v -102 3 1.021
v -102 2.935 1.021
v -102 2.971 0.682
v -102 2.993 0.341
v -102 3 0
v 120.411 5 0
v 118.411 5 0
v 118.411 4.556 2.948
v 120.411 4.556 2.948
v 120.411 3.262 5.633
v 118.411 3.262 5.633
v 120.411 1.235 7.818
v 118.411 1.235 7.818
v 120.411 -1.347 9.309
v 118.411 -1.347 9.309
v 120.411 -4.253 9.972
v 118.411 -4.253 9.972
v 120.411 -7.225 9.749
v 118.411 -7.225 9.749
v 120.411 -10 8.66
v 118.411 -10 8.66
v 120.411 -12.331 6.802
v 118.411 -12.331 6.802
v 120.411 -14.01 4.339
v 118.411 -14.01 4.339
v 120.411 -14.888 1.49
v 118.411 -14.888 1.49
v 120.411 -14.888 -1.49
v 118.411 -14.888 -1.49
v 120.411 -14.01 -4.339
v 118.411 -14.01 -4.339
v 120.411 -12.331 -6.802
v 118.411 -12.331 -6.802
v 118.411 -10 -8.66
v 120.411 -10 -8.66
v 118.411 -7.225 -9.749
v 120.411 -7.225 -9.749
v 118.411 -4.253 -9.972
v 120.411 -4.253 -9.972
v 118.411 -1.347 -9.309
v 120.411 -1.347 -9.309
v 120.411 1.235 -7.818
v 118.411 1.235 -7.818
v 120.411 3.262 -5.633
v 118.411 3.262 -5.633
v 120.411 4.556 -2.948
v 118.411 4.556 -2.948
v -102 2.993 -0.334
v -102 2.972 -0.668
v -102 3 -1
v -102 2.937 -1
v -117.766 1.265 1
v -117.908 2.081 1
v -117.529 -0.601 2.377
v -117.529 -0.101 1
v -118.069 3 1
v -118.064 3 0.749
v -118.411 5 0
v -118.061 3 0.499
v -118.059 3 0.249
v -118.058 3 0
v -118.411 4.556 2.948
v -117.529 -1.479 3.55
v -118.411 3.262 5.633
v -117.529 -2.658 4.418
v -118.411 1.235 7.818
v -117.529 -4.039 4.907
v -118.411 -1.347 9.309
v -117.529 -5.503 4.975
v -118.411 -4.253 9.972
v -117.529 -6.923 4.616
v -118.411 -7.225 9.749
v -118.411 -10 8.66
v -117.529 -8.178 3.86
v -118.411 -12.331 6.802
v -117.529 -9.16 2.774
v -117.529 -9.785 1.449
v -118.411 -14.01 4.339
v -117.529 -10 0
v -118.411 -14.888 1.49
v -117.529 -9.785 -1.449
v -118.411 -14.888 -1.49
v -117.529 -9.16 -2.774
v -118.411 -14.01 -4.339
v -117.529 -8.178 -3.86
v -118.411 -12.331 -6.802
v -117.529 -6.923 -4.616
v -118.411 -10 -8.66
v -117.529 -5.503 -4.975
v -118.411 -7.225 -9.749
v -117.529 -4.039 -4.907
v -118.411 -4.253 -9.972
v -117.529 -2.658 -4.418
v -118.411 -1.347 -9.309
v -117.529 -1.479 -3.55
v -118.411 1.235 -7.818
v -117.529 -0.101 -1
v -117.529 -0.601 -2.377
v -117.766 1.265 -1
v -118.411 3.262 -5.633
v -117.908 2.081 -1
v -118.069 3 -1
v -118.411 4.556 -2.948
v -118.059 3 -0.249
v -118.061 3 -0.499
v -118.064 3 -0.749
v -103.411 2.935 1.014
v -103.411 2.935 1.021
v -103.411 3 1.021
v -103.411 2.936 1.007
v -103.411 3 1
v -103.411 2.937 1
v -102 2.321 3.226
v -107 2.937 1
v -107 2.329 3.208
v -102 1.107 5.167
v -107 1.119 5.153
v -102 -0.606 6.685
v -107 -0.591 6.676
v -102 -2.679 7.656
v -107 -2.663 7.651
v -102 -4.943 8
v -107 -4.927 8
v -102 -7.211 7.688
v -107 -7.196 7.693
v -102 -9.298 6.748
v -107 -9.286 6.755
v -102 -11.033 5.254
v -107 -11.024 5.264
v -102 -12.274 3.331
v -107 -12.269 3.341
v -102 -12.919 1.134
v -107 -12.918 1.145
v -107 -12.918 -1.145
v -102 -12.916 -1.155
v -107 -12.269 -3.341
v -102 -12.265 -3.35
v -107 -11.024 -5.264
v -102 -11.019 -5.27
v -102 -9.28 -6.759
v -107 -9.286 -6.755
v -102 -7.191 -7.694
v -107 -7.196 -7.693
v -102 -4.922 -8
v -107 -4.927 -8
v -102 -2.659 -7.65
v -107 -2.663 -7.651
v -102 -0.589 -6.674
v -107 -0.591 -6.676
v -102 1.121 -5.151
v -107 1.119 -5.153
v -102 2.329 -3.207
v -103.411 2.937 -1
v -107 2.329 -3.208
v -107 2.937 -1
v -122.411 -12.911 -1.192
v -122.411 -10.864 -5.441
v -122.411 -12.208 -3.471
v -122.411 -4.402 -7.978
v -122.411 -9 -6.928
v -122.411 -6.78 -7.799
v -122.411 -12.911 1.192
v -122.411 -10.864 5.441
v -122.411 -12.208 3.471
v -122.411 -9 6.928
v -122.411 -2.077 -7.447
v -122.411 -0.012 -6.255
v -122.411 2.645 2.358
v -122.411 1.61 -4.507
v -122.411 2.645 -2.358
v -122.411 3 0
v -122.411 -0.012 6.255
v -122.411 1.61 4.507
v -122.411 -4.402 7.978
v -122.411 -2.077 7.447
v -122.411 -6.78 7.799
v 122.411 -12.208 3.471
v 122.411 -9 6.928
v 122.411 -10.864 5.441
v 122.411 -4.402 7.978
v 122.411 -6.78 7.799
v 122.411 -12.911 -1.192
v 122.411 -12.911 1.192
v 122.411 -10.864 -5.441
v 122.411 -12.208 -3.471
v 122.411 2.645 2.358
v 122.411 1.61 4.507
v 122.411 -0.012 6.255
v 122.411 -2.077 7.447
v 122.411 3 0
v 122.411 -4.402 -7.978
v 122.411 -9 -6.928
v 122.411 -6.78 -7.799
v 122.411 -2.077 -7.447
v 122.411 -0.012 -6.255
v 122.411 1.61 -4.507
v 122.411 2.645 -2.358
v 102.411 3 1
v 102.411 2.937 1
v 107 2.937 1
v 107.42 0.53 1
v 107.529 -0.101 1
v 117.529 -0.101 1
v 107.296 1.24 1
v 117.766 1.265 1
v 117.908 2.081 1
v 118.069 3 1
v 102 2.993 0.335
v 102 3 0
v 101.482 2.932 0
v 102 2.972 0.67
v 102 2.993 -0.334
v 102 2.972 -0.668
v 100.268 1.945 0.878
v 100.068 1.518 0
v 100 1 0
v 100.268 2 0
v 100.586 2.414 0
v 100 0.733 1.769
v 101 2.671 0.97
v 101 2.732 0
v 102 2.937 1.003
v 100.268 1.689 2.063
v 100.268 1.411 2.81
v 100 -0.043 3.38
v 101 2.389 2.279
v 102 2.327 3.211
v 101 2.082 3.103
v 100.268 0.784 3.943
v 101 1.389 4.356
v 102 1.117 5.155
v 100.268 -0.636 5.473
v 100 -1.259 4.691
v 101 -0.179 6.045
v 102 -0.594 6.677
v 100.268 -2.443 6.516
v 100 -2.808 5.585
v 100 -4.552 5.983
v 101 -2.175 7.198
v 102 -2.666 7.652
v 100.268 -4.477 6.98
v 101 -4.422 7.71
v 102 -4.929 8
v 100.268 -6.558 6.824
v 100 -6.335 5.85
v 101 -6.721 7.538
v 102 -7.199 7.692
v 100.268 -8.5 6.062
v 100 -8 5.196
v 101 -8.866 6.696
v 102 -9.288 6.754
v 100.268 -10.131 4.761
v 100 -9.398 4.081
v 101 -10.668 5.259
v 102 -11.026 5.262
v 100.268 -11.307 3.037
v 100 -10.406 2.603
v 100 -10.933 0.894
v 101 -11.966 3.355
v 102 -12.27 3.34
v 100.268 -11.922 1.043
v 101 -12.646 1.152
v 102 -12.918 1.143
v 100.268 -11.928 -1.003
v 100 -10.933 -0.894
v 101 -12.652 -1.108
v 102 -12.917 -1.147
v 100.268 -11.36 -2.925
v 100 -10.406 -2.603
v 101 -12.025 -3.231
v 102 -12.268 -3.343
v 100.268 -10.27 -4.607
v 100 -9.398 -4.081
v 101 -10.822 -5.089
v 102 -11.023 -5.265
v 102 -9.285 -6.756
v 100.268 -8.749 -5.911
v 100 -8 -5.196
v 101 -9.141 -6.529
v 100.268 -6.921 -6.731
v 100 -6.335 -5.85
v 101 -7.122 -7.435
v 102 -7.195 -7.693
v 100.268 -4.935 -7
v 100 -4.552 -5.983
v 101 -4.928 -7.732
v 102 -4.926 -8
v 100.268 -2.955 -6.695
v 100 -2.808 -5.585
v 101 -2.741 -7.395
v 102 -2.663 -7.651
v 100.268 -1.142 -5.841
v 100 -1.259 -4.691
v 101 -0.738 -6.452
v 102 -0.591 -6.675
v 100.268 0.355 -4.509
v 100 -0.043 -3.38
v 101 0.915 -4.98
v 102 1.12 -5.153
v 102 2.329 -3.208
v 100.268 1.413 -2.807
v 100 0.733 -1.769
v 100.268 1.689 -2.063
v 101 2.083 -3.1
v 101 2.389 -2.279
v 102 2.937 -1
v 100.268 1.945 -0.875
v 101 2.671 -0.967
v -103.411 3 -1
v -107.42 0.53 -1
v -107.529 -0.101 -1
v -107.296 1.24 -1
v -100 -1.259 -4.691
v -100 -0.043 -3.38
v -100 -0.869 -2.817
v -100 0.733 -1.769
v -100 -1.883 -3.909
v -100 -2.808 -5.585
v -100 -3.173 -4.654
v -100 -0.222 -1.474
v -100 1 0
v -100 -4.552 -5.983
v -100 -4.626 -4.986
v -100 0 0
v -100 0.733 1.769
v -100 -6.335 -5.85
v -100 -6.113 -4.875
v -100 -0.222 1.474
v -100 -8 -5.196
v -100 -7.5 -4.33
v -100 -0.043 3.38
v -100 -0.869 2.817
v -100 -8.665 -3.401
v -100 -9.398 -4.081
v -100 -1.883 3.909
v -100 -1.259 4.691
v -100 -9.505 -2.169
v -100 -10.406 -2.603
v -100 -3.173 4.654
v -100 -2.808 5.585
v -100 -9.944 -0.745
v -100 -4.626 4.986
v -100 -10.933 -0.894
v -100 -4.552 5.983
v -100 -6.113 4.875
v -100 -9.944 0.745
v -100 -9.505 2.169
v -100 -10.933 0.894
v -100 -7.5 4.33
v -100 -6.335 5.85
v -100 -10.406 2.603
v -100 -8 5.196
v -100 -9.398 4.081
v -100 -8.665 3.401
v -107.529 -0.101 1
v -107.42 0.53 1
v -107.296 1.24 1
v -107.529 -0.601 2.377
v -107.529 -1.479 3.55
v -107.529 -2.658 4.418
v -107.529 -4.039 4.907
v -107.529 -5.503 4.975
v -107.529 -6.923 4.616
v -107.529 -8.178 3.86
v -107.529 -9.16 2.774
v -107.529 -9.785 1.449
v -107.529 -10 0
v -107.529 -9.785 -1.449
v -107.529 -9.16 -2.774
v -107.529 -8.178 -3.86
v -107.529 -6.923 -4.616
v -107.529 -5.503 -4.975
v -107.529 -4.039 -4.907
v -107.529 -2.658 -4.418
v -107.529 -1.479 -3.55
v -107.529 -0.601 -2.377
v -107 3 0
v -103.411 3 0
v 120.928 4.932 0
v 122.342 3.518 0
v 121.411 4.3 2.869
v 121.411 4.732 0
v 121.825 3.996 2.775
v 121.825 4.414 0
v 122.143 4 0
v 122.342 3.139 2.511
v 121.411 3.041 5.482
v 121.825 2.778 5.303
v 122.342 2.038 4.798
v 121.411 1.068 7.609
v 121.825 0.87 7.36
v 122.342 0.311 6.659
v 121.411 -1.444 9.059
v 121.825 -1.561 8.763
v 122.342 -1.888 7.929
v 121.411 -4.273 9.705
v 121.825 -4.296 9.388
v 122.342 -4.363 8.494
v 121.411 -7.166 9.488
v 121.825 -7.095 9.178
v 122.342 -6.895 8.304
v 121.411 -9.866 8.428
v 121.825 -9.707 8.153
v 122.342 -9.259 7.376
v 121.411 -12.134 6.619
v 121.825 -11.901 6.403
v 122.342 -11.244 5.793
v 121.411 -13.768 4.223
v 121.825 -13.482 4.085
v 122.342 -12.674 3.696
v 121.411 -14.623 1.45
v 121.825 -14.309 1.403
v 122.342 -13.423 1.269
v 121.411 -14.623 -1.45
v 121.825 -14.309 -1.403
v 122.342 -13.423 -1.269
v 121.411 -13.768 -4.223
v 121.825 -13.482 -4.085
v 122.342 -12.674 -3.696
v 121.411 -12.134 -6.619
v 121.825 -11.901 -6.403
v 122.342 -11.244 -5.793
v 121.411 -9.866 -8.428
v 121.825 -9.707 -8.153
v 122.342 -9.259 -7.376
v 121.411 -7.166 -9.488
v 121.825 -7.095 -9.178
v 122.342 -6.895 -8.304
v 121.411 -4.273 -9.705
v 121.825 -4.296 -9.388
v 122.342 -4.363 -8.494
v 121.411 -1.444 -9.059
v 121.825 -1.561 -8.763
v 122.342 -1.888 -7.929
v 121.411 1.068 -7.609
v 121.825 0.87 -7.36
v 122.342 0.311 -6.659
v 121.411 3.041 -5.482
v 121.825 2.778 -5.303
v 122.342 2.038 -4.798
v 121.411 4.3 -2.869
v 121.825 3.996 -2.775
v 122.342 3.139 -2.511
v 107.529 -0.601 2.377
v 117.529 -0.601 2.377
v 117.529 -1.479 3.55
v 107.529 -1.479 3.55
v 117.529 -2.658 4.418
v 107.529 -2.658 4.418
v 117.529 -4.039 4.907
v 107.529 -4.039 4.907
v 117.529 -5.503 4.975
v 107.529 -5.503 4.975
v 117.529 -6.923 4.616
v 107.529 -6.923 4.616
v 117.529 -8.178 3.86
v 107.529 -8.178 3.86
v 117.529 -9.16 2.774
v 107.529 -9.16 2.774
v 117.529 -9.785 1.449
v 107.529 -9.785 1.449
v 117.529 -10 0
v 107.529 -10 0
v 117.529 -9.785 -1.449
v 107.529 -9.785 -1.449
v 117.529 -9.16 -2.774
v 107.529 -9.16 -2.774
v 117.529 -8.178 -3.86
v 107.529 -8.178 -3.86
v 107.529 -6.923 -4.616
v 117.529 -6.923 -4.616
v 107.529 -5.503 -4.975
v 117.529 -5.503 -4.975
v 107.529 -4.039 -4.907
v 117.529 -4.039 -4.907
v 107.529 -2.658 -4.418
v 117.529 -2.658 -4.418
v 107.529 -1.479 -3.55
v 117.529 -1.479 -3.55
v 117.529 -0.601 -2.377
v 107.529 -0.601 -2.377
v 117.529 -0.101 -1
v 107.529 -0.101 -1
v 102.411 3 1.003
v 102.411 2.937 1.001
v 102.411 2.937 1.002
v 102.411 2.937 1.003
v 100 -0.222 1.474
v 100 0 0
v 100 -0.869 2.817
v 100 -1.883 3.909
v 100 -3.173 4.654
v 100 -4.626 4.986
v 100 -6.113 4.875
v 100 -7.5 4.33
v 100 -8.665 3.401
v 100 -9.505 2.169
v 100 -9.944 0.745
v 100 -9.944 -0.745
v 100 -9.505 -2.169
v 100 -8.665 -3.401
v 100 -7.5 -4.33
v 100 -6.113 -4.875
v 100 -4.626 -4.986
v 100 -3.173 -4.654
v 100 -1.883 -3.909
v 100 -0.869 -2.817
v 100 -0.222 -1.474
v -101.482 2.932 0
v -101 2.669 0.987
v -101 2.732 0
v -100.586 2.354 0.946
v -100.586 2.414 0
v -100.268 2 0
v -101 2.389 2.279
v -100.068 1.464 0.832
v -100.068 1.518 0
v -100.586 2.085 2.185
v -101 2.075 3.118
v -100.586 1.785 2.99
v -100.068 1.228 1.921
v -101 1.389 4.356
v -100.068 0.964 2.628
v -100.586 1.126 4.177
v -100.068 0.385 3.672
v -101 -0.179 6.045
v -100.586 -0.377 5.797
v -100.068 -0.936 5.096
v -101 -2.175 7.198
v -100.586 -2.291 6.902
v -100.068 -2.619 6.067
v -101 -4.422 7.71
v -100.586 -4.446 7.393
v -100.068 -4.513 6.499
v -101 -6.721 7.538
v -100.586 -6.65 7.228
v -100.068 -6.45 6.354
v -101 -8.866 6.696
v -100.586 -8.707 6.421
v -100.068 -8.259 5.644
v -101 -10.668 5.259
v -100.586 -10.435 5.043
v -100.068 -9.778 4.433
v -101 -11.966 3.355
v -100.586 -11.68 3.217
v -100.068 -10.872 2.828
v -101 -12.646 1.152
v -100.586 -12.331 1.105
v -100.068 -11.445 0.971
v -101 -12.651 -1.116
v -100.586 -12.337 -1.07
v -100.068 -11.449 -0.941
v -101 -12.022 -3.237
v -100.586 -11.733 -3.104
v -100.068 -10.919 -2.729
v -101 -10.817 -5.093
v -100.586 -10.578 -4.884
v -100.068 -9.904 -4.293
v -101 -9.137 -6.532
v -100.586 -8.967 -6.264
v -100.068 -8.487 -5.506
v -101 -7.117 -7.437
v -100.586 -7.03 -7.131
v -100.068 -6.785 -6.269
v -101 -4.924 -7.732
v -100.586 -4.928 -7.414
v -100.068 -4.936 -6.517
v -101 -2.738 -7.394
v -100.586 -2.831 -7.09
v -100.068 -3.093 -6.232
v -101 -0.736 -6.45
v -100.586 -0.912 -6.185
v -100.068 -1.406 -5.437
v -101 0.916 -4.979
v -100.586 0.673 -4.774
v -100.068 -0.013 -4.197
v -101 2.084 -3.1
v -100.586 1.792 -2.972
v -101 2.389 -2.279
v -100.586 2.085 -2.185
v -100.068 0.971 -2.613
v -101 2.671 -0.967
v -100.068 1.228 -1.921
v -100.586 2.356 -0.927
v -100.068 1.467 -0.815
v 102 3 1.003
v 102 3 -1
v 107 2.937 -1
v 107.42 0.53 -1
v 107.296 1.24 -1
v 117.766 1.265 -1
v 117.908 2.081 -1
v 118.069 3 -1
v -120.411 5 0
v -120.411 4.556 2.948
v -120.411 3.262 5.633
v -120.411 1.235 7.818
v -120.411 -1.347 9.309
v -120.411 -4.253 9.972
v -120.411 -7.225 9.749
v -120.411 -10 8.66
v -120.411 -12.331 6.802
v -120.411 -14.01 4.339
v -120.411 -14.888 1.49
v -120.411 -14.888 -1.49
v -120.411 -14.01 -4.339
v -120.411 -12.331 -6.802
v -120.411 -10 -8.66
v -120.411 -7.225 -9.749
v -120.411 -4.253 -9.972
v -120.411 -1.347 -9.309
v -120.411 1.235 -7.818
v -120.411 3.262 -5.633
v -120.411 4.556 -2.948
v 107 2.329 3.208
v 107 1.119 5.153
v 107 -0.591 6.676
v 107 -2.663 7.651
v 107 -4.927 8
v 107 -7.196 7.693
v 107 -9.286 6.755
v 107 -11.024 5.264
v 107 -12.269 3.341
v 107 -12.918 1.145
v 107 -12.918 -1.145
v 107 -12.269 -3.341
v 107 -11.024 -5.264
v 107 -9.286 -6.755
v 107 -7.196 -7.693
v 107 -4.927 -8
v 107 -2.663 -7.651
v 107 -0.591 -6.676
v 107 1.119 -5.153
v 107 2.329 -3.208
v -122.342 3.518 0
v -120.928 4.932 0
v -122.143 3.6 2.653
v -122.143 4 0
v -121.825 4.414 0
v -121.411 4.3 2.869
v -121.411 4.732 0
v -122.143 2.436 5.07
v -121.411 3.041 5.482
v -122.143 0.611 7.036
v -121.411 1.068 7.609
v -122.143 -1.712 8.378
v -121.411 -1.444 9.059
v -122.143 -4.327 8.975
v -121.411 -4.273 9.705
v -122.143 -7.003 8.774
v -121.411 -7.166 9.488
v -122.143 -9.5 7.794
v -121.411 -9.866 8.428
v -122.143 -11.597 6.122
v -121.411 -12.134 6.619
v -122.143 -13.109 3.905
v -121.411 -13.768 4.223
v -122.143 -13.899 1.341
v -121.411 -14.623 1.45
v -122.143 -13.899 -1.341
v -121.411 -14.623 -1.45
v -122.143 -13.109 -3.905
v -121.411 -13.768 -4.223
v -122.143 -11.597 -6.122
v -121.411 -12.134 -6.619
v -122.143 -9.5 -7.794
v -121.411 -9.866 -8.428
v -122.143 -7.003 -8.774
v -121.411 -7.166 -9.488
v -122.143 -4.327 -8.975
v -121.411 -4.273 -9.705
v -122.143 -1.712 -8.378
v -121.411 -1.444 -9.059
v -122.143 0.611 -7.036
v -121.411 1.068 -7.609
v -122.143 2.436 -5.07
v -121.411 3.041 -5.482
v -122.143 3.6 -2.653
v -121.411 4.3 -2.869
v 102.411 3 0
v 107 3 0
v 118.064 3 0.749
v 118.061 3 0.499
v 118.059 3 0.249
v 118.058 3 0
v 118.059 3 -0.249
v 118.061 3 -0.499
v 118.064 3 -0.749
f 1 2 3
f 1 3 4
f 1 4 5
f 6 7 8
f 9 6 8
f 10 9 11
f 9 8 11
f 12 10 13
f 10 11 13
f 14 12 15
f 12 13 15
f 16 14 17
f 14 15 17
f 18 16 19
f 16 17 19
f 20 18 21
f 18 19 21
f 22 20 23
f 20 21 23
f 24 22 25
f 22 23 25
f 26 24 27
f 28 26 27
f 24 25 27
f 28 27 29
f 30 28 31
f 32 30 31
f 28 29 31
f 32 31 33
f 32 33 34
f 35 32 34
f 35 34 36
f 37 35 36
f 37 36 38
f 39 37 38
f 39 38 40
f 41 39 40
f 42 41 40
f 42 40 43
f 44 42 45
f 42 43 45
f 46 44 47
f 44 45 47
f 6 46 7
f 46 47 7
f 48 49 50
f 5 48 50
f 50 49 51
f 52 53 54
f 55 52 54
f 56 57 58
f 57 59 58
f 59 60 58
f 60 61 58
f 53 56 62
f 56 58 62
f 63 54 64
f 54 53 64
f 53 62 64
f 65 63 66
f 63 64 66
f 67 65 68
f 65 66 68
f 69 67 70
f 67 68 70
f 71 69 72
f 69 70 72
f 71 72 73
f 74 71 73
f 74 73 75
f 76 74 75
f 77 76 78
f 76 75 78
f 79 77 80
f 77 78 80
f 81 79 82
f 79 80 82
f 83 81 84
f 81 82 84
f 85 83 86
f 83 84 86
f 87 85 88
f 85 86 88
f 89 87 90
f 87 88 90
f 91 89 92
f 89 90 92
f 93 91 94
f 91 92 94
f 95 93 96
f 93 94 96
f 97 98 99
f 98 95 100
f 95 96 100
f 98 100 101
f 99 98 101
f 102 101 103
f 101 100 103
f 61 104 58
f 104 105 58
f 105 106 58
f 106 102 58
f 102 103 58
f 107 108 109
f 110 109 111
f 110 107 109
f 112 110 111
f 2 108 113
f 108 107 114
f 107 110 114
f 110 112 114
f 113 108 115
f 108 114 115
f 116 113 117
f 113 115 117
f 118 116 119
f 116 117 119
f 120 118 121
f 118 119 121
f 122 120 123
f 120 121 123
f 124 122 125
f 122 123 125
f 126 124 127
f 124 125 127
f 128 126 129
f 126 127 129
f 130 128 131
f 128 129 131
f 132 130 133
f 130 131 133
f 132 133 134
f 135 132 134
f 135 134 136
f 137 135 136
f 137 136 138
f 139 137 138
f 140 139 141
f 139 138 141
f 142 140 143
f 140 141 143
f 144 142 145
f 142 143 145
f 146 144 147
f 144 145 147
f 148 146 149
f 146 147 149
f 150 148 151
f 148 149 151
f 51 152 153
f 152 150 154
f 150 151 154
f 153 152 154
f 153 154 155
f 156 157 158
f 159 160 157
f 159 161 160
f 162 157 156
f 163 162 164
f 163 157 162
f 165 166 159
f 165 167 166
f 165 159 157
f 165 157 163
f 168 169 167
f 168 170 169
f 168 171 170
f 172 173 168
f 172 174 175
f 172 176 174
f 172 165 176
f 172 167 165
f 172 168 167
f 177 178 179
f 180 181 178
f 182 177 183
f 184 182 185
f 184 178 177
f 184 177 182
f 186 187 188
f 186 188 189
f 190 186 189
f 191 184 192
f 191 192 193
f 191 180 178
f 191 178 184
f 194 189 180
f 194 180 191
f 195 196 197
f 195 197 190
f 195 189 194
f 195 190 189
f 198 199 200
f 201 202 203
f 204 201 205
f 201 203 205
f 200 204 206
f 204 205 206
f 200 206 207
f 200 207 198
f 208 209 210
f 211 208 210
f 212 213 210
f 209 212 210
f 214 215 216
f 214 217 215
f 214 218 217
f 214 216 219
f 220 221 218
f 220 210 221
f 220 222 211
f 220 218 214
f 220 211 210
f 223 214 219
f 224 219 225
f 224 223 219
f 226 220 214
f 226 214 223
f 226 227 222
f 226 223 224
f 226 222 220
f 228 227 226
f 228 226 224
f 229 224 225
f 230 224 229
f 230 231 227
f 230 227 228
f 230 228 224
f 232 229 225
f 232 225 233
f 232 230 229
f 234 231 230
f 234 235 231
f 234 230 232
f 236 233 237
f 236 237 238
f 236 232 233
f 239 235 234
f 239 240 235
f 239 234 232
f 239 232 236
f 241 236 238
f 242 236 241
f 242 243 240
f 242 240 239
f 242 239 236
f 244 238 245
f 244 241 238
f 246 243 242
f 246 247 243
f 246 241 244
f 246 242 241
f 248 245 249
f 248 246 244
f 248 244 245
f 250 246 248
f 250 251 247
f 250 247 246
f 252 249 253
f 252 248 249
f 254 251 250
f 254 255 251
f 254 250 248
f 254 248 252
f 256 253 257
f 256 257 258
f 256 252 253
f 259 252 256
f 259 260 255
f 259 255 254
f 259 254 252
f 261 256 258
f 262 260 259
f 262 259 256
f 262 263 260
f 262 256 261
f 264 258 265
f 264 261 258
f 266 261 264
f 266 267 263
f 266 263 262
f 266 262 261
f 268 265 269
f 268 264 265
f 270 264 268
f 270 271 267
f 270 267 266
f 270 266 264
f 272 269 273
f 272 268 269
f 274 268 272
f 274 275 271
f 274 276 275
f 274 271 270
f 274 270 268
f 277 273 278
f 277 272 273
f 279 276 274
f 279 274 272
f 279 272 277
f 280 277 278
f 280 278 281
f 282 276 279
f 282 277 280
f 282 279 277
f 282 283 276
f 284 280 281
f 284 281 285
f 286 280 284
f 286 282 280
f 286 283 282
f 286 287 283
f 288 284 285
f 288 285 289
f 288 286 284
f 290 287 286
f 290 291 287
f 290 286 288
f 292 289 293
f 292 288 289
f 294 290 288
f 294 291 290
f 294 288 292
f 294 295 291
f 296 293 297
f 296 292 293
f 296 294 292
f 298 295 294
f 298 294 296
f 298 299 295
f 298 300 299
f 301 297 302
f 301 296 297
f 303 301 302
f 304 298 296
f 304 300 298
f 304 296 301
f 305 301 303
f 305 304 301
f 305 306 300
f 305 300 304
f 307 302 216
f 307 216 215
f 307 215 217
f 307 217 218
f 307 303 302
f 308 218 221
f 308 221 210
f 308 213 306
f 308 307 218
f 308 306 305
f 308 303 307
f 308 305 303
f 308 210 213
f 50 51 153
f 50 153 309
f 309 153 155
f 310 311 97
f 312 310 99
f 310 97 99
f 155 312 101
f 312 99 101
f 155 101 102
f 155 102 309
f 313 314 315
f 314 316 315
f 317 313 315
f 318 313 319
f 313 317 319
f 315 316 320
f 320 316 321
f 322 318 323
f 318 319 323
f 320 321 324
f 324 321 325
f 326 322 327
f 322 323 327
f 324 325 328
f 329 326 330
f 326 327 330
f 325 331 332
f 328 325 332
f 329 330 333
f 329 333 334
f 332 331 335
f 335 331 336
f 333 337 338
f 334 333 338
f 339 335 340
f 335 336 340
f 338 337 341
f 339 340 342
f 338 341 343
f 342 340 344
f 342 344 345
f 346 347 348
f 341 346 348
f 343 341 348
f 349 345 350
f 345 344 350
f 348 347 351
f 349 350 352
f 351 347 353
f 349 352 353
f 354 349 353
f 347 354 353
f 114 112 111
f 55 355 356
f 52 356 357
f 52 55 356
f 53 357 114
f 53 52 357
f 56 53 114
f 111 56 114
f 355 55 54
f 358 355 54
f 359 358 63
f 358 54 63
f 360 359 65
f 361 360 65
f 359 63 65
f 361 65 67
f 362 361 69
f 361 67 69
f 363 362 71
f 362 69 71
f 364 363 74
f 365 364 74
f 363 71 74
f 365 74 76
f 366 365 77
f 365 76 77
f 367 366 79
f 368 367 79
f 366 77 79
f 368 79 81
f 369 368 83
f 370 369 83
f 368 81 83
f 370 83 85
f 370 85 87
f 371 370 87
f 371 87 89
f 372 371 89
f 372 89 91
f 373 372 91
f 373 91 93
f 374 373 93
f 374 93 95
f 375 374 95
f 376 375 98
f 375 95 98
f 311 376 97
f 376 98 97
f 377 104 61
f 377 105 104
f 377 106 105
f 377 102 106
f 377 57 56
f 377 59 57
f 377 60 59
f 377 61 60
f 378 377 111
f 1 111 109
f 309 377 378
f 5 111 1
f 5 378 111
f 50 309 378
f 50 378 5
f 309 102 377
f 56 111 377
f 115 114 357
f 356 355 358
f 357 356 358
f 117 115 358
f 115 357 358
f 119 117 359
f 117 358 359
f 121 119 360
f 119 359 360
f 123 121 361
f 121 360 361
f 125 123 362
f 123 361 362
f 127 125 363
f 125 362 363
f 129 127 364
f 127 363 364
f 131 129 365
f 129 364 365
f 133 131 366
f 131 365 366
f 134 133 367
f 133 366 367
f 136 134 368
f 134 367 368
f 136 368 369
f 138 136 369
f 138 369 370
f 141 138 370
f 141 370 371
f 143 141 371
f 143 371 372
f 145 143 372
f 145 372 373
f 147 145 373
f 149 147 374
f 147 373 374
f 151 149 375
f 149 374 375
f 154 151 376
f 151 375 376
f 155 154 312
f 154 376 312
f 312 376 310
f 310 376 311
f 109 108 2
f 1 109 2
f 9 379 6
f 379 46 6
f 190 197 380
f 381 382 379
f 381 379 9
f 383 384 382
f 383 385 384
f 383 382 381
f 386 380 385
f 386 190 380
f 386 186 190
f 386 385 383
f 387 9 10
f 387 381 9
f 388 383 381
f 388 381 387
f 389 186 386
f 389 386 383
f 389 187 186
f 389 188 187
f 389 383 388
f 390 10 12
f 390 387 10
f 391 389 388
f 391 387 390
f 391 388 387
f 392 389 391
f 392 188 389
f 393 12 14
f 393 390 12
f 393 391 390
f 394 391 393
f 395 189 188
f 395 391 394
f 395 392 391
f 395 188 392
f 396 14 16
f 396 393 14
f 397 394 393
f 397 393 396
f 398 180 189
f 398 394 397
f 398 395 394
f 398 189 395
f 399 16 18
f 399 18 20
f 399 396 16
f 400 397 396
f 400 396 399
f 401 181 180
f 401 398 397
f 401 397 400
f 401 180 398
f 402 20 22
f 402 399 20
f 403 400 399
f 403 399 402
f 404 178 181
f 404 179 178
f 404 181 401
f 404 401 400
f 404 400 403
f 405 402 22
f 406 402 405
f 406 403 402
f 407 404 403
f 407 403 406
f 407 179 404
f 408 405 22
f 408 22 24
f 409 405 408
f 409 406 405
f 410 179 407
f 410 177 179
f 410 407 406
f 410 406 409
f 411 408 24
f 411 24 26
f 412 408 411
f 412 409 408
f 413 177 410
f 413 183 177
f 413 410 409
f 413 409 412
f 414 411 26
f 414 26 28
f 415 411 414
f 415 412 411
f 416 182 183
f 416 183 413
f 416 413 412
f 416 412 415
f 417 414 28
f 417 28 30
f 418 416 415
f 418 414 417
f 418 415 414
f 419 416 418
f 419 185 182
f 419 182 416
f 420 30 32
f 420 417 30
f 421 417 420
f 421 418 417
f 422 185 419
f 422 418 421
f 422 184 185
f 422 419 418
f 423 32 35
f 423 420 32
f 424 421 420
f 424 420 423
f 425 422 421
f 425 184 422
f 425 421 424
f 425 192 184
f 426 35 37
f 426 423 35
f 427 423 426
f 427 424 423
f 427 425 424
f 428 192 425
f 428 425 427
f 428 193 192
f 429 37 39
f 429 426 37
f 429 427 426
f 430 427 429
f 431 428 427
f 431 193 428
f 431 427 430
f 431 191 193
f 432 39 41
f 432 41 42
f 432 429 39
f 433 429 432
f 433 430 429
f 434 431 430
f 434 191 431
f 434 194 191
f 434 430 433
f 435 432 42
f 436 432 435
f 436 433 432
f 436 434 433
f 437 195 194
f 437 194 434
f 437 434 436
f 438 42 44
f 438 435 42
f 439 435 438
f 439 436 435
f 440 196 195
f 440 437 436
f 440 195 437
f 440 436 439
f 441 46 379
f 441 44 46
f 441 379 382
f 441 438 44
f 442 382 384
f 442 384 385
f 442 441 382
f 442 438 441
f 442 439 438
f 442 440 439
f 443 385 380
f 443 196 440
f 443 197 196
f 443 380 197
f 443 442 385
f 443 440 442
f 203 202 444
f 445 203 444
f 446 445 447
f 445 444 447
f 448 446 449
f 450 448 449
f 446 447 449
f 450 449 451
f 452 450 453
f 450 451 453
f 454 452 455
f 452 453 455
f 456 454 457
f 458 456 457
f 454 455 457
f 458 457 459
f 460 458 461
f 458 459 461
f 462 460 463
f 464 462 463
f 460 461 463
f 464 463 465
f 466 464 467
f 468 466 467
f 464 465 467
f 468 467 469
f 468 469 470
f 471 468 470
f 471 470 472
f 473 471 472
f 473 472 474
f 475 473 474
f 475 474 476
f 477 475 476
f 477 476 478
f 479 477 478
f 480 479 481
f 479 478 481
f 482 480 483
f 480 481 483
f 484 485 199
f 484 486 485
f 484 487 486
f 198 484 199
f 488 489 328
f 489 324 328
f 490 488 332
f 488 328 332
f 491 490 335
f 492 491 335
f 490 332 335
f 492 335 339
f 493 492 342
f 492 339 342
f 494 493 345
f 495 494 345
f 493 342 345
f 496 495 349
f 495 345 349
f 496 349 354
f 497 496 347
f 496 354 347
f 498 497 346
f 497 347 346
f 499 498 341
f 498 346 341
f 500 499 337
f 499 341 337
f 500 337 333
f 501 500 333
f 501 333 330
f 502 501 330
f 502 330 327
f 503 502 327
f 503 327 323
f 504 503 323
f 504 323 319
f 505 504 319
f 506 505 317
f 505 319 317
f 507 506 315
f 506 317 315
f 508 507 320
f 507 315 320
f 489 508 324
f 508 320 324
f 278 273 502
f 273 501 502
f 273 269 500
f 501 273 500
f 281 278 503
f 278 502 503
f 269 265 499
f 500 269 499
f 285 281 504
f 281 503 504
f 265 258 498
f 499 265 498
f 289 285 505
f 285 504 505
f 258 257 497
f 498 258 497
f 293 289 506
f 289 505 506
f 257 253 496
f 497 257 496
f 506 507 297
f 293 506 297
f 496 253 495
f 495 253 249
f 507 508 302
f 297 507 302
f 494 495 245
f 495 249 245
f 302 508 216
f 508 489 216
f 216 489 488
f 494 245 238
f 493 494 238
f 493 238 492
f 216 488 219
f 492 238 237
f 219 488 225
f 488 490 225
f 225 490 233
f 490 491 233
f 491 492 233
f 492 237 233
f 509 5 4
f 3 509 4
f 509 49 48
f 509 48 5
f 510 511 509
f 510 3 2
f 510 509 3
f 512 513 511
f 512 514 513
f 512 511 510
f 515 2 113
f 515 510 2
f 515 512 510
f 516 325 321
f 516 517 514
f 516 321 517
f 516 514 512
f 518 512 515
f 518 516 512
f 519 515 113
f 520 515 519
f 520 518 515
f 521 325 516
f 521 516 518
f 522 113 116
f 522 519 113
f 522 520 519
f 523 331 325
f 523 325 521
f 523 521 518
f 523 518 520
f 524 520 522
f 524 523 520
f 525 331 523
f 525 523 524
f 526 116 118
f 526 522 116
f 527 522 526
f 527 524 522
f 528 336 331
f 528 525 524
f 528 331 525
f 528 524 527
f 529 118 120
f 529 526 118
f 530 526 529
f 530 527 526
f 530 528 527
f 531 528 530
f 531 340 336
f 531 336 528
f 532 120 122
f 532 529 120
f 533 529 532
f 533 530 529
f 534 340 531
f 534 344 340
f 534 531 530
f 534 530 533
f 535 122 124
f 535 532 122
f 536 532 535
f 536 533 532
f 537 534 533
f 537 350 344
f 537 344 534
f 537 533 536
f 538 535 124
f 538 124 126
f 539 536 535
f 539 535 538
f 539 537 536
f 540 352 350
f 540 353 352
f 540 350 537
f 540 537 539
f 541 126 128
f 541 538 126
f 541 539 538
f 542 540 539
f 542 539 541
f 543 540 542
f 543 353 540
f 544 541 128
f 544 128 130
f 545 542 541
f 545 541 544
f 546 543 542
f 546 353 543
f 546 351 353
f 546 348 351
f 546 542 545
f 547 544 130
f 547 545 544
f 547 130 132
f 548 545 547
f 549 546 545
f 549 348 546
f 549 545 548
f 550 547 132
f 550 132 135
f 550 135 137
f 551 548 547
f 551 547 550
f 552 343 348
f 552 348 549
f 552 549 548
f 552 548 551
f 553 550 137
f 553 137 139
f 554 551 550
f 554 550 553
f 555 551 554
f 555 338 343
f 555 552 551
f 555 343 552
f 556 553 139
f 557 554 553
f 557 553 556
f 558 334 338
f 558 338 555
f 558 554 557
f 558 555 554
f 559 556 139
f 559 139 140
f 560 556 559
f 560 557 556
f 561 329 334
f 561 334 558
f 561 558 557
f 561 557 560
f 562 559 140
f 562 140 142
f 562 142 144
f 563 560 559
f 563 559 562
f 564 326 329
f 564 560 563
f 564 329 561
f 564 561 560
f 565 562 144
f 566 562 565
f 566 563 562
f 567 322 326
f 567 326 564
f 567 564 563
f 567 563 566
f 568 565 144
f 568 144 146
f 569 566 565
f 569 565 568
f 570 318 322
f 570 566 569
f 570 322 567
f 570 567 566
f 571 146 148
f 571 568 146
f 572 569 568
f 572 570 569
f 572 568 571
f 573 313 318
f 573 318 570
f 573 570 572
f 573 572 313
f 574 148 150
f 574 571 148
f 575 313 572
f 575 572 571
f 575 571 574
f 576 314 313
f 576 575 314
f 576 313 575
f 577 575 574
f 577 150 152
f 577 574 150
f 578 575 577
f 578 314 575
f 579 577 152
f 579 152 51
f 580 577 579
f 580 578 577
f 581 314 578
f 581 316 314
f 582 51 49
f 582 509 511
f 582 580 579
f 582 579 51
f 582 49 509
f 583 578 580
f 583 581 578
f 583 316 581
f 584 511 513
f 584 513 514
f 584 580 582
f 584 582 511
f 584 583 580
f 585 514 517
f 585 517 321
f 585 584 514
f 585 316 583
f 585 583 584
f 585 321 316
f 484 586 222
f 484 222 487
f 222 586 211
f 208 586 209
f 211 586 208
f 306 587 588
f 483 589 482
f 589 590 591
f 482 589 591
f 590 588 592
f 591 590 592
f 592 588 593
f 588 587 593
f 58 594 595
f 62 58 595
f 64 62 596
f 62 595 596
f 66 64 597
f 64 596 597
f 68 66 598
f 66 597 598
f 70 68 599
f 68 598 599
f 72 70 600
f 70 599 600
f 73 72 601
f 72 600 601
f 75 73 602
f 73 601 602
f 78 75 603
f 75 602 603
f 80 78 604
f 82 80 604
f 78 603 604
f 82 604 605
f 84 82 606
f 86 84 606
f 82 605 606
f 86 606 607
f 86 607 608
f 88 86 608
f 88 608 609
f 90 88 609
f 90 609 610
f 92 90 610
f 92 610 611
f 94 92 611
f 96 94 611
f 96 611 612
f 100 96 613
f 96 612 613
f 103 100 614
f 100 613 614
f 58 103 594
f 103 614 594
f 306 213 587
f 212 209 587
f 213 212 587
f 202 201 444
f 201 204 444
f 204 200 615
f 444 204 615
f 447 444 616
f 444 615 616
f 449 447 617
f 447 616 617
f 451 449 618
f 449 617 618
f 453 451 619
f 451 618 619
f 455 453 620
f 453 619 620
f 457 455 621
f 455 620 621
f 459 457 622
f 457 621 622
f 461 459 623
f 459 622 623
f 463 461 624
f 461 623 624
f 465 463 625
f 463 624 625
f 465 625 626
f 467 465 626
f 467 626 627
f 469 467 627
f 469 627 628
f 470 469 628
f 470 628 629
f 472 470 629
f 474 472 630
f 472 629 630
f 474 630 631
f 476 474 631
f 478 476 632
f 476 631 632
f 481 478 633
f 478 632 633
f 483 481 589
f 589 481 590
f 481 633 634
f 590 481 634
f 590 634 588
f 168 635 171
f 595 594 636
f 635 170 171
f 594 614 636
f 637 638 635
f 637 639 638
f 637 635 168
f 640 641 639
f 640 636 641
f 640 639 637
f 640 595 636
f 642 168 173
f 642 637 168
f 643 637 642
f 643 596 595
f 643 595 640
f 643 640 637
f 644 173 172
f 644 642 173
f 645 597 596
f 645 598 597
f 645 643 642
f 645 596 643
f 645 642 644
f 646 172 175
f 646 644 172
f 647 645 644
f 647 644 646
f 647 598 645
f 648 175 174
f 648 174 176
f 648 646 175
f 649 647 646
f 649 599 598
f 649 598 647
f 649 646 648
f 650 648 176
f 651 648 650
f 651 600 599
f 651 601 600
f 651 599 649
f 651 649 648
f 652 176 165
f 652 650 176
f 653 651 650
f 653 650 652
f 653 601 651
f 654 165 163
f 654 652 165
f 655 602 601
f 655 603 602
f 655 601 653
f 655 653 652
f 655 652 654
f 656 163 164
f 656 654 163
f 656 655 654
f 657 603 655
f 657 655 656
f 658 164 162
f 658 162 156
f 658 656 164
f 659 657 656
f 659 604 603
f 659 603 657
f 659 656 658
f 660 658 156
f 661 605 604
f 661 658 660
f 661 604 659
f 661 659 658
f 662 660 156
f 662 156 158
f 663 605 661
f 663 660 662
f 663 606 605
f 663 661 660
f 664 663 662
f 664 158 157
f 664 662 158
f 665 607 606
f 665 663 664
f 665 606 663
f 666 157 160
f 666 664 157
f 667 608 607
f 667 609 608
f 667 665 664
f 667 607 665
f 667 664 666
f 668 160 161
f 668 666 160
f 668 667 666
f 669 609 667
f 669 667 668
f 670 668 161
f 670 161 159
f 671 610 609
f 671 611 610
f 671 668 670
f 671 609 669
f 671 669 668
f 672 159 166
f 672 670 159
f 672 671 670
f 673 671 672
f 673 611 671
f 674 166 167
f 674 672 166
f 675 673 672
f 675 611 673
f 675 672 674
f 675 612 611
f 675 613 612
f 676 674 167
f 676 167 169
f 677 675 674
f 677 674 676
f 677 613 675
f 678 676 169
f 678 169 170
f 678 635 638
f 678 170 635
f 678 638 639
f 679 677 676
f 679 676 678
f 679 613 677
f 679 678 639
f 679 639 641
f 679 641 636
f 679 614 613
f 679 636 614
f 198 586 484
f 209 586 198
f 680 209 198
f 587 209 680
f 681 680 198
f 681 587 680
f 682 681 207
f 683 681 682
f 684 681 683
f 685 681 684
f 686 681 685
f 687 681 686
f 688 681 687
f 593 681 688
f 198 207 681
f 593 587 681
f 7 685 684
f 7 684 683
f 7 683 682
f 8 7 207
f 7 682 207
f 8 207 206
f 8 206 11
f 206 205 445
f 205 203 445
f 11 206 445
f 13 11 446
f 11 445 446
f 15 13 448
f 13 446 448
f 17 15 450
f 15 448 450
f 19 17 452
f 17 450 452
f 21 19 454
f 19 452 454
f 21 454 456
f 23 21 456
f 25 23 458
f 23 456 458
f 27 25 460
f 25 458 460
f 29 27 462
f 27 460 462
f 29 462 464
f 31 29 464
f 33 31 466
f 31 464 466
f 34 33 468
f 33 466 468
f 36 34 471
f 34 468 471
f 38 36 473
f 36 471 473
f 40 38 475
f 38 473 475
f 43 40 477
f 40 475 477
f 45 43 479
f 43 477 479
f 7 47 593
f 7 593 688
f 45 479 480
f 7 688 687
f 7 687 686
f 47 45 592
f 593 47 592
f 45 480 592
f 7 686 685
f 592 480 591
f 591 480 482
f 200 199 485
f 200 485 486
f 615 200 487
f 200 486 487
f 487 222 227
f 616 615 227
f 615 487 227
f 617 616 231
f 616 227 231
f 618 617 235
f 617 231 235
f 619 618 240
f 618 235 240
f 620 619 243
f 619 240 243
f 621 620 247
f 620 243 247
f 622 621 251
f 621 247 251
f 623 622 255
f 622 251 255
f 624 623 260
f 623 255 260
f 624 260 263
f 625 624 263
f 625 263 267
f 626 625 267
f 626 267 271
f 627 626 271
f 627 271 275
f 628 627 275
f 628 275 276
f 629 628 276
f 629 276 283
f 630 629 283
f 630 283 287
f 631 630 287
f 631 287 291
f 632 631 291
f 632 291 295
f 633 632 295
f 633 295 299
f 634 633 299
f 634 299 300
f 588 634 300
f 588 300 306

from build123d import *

# Parameters (mm, degrees)
SKETCH3_W           = 2
SKETCH3_H           = 8.955152332
BOSS_EXTRUDE1_DEPTH = 20
SKETCH4_W           = 2
SKETCH4_H           = 8
BOSS_EXTRUDE2_DEPTH = 19
FILLET1_R           = 2
BOSS_EXTRUDE4_START = -0.065389
SKETCH6_W           = 1.410615846
SKETCH6_H           = 2.020756053
BOSS_EXTRUDE4_DEPTH = 0.065389
BOSS_EXTRUDE5_REACH = 20
SKETCH7_W           = 0.410615846
SKETCH7_H           = 2.003452902


with BuildPart() as part:
    # Sketch2 → Revolve2 (revolve)
    with BuildSketch(Plane.XY):
        Polygon((100, 3), (100, 0), (-100, 0), (-100, 3), (-107, 3), (-107.528980942, 0), (-117.528980942, 0), (-118.410615846, 5), (-122.410615846, 5), (-122.410615846, -5), (122.410615846, -5), (122.410615846, 5), (118.410615846, 5), (117.528980942, 0), (107.528980942, 0), (107, 3), align=None)
    revolve(axis=Axis((-122.410615846, -5, 0), (1, 0, 0)))

    # Sketch3 → Boss-Extrude1 (add)
    with BuildSketch(Plane(origin=(122.410615846, 0, 0), x_dir=(0, 0, -1), z_dir=(1, 0, 0))):
        with Locations((0, -1.477576166)):
            Rectangle(SKETCH3_W, SKETCH3_H)
    extrude(amount=-BOSS_EXTRUDE1_DEPTH)

    # Sketch4 → Boss-Extrude2 (add)
    with BuildSketch(Plane.ZY.offset(122.410615846)):
        with Locations((0, -1)):
            Rectangle(SKETCH4_W, SKETCH4_H)
    extrude(amount=-BOSS_EXTRUDE2_DEPTH)

    # Fillet1
    fillet1_edges = [part.edges().sort_by_distance(p)[0] for p in [
        (-122.410615846, -15, 0),
        (-100, -13, 0),
        (100, -13, 0),
        (122.410615846, -15, 0),
    ]]
    fillet(fillet1_edges, radius=FILLET1_R)

    # Sketch6 → Boss-Extrude4 (add)
    with BuildSketch(Plane(origin=(0, 3, 0), x_dir=(1, 0, 0), z_dir=(0, 1, 0)).offset(BOSS_EXTRUDE4_START)):
        with Locations((-102.705307923, -0.010378027)):
            Rectangle(SKETCH6_W, SKETCH6_H)
    extrude(amount=BOSS_EXTRUDE4_DEPTH)

    # Sketch7 → Boss-Extrude5 (add, up to next)
    with BuildSketch(Plane(origin=(0, 3, 0), x_dir=(1, 0, 0), z_dir=(0, 1, 0)), mode=Mode.PRIVATE) as boss_extrude5_sk1:
        with Locations((102.205307923, -0.001726451)):
            Rectangle(SKETCH7_W, SKETCH7_H)
    boss_extrude5_tool1 = extrude(boss_extrude5_sk1.sketch, amount=-BOSS_EXTRUDE5_REACH, mode=Mode.PRIVATE) - part.part
    add(boss_extrude5_tool1.solids().sort_by_distance((102.205308, 3, 0.001726))[0])
    add(boss_extrude5_tool1.solids().sort_by_distance((102.205308, 3, 0.001726))[1])


solid = part.part
